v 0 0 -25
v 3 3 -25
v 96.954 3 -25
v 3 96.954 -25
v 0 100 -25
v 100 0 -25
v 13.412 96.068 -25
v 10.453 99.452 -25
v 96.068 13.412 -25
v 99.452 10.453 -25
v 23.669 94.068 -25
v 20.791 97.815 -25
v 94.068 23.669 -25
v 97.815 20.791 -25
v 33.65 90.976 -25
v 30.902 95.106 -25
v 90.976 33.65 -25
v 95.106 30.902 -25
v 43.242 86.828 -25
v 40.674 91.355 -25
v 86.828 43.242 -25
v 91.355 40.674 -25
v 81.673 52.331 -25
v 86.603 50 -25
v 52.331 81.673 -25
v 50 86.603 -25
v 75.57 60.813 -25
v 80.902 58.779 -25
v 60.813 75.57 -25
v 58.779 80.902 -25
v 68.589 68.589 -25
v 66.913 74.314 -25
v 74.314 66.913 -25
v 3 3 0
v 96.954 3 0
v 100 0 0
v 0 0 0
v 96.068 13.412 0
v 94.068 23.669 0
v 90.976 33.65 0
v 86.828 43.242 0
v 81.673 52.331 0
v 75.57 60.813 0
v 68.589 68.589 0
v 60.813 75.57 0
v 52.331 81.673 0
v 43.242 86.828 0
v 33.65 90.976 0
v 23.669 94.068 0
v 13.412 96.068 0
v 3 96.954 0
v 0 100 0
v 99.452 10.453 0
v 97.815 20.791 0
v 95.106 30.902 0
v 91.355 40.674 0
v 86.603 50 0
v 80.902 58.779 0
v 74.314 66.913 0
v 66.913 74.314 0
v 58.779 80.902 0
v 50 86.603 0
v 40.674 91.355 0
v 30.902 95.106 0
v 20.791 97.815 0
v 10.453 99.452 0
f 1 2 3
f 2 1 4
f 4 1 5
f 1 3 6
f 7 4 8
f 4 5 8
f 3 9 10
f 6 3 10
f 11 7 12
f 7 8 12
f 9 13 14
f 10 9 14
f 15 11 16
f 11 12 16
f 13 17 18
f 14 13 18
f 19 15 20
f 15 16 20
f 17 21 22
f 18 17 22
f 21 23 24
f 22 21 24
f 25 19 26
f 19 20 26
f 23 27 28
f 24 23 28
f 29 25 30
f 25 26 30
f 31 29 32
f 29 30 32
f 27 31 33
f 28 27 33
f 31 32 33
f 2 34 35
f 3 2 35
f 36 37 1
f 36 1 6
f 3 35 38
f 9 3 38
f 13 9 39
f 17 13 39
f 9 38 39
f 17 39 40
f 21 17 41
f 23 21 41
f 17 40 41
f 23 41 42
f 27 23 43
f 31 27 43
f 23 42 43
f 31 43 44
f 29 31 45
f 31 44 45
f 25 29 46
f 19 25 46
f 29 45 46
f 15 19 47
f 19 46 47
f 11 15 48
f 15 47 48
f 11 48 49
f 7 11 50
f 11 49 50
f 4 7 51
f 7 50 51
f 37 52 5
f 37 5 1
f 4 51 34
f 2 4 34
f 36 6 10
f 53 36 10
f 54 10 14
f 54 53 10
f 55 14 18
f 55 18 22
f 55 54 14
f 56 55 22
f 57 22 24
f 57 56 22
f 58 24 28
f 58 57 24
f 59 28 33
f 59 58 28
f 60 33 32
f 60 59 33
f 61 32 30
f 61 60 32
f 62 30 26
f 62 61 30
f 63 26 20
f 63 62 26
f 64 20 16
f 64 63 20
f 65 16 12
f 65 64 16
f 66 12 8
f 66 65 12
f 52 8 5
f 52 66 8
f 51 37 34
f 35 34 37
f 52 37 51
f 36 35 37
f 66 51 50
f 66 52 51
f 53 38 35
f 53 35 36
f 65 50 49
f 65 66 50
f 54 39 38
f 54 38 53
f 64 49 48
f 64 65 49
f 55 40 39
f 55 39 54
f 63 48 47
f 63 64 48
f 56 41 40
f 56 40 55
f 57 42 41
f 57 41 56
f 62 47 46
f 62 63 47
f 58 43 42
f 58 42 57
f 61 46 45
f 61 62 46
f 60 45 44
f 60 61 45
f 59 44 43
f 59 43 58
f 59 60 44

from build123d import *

# Parameters (mm, degrees)
F1_DEPTH = 25
F2_T     = -3
F3_DEPTH = 25


with BuildPart() as f1:
    # F0 (on Top) → F1 (new body)
    with BuildSketch(Plane.XY):
        with BuildLine():
            Line((0, 100), (0, 0))
            Line((0, 0), (100, 0))
            ThreePointArc((100, 0), (70.7106781187, 70.7106781187), (0, 100))
        make_face()
    extrude(amount=-F1_DEPTH)

    # F2
    f2_openings = [f1.faces().sort_by_distance(p)[0] for p in [
        (42.441318, 42.441318, 0),
    ]]
    offset(amount=F2_T, openings=f2_openings)

    # F3 (cut): a face of the model
    f3_faces = [f1.faces().sort_by_distance(p)[0] for p in [
        (42.4961878284, 42.4961878284, -22),
    ]]
    extrude(f3_faces, amount=-F3_DEPTH, mode=Mode.SUBTRACT)


solid = f1.part
